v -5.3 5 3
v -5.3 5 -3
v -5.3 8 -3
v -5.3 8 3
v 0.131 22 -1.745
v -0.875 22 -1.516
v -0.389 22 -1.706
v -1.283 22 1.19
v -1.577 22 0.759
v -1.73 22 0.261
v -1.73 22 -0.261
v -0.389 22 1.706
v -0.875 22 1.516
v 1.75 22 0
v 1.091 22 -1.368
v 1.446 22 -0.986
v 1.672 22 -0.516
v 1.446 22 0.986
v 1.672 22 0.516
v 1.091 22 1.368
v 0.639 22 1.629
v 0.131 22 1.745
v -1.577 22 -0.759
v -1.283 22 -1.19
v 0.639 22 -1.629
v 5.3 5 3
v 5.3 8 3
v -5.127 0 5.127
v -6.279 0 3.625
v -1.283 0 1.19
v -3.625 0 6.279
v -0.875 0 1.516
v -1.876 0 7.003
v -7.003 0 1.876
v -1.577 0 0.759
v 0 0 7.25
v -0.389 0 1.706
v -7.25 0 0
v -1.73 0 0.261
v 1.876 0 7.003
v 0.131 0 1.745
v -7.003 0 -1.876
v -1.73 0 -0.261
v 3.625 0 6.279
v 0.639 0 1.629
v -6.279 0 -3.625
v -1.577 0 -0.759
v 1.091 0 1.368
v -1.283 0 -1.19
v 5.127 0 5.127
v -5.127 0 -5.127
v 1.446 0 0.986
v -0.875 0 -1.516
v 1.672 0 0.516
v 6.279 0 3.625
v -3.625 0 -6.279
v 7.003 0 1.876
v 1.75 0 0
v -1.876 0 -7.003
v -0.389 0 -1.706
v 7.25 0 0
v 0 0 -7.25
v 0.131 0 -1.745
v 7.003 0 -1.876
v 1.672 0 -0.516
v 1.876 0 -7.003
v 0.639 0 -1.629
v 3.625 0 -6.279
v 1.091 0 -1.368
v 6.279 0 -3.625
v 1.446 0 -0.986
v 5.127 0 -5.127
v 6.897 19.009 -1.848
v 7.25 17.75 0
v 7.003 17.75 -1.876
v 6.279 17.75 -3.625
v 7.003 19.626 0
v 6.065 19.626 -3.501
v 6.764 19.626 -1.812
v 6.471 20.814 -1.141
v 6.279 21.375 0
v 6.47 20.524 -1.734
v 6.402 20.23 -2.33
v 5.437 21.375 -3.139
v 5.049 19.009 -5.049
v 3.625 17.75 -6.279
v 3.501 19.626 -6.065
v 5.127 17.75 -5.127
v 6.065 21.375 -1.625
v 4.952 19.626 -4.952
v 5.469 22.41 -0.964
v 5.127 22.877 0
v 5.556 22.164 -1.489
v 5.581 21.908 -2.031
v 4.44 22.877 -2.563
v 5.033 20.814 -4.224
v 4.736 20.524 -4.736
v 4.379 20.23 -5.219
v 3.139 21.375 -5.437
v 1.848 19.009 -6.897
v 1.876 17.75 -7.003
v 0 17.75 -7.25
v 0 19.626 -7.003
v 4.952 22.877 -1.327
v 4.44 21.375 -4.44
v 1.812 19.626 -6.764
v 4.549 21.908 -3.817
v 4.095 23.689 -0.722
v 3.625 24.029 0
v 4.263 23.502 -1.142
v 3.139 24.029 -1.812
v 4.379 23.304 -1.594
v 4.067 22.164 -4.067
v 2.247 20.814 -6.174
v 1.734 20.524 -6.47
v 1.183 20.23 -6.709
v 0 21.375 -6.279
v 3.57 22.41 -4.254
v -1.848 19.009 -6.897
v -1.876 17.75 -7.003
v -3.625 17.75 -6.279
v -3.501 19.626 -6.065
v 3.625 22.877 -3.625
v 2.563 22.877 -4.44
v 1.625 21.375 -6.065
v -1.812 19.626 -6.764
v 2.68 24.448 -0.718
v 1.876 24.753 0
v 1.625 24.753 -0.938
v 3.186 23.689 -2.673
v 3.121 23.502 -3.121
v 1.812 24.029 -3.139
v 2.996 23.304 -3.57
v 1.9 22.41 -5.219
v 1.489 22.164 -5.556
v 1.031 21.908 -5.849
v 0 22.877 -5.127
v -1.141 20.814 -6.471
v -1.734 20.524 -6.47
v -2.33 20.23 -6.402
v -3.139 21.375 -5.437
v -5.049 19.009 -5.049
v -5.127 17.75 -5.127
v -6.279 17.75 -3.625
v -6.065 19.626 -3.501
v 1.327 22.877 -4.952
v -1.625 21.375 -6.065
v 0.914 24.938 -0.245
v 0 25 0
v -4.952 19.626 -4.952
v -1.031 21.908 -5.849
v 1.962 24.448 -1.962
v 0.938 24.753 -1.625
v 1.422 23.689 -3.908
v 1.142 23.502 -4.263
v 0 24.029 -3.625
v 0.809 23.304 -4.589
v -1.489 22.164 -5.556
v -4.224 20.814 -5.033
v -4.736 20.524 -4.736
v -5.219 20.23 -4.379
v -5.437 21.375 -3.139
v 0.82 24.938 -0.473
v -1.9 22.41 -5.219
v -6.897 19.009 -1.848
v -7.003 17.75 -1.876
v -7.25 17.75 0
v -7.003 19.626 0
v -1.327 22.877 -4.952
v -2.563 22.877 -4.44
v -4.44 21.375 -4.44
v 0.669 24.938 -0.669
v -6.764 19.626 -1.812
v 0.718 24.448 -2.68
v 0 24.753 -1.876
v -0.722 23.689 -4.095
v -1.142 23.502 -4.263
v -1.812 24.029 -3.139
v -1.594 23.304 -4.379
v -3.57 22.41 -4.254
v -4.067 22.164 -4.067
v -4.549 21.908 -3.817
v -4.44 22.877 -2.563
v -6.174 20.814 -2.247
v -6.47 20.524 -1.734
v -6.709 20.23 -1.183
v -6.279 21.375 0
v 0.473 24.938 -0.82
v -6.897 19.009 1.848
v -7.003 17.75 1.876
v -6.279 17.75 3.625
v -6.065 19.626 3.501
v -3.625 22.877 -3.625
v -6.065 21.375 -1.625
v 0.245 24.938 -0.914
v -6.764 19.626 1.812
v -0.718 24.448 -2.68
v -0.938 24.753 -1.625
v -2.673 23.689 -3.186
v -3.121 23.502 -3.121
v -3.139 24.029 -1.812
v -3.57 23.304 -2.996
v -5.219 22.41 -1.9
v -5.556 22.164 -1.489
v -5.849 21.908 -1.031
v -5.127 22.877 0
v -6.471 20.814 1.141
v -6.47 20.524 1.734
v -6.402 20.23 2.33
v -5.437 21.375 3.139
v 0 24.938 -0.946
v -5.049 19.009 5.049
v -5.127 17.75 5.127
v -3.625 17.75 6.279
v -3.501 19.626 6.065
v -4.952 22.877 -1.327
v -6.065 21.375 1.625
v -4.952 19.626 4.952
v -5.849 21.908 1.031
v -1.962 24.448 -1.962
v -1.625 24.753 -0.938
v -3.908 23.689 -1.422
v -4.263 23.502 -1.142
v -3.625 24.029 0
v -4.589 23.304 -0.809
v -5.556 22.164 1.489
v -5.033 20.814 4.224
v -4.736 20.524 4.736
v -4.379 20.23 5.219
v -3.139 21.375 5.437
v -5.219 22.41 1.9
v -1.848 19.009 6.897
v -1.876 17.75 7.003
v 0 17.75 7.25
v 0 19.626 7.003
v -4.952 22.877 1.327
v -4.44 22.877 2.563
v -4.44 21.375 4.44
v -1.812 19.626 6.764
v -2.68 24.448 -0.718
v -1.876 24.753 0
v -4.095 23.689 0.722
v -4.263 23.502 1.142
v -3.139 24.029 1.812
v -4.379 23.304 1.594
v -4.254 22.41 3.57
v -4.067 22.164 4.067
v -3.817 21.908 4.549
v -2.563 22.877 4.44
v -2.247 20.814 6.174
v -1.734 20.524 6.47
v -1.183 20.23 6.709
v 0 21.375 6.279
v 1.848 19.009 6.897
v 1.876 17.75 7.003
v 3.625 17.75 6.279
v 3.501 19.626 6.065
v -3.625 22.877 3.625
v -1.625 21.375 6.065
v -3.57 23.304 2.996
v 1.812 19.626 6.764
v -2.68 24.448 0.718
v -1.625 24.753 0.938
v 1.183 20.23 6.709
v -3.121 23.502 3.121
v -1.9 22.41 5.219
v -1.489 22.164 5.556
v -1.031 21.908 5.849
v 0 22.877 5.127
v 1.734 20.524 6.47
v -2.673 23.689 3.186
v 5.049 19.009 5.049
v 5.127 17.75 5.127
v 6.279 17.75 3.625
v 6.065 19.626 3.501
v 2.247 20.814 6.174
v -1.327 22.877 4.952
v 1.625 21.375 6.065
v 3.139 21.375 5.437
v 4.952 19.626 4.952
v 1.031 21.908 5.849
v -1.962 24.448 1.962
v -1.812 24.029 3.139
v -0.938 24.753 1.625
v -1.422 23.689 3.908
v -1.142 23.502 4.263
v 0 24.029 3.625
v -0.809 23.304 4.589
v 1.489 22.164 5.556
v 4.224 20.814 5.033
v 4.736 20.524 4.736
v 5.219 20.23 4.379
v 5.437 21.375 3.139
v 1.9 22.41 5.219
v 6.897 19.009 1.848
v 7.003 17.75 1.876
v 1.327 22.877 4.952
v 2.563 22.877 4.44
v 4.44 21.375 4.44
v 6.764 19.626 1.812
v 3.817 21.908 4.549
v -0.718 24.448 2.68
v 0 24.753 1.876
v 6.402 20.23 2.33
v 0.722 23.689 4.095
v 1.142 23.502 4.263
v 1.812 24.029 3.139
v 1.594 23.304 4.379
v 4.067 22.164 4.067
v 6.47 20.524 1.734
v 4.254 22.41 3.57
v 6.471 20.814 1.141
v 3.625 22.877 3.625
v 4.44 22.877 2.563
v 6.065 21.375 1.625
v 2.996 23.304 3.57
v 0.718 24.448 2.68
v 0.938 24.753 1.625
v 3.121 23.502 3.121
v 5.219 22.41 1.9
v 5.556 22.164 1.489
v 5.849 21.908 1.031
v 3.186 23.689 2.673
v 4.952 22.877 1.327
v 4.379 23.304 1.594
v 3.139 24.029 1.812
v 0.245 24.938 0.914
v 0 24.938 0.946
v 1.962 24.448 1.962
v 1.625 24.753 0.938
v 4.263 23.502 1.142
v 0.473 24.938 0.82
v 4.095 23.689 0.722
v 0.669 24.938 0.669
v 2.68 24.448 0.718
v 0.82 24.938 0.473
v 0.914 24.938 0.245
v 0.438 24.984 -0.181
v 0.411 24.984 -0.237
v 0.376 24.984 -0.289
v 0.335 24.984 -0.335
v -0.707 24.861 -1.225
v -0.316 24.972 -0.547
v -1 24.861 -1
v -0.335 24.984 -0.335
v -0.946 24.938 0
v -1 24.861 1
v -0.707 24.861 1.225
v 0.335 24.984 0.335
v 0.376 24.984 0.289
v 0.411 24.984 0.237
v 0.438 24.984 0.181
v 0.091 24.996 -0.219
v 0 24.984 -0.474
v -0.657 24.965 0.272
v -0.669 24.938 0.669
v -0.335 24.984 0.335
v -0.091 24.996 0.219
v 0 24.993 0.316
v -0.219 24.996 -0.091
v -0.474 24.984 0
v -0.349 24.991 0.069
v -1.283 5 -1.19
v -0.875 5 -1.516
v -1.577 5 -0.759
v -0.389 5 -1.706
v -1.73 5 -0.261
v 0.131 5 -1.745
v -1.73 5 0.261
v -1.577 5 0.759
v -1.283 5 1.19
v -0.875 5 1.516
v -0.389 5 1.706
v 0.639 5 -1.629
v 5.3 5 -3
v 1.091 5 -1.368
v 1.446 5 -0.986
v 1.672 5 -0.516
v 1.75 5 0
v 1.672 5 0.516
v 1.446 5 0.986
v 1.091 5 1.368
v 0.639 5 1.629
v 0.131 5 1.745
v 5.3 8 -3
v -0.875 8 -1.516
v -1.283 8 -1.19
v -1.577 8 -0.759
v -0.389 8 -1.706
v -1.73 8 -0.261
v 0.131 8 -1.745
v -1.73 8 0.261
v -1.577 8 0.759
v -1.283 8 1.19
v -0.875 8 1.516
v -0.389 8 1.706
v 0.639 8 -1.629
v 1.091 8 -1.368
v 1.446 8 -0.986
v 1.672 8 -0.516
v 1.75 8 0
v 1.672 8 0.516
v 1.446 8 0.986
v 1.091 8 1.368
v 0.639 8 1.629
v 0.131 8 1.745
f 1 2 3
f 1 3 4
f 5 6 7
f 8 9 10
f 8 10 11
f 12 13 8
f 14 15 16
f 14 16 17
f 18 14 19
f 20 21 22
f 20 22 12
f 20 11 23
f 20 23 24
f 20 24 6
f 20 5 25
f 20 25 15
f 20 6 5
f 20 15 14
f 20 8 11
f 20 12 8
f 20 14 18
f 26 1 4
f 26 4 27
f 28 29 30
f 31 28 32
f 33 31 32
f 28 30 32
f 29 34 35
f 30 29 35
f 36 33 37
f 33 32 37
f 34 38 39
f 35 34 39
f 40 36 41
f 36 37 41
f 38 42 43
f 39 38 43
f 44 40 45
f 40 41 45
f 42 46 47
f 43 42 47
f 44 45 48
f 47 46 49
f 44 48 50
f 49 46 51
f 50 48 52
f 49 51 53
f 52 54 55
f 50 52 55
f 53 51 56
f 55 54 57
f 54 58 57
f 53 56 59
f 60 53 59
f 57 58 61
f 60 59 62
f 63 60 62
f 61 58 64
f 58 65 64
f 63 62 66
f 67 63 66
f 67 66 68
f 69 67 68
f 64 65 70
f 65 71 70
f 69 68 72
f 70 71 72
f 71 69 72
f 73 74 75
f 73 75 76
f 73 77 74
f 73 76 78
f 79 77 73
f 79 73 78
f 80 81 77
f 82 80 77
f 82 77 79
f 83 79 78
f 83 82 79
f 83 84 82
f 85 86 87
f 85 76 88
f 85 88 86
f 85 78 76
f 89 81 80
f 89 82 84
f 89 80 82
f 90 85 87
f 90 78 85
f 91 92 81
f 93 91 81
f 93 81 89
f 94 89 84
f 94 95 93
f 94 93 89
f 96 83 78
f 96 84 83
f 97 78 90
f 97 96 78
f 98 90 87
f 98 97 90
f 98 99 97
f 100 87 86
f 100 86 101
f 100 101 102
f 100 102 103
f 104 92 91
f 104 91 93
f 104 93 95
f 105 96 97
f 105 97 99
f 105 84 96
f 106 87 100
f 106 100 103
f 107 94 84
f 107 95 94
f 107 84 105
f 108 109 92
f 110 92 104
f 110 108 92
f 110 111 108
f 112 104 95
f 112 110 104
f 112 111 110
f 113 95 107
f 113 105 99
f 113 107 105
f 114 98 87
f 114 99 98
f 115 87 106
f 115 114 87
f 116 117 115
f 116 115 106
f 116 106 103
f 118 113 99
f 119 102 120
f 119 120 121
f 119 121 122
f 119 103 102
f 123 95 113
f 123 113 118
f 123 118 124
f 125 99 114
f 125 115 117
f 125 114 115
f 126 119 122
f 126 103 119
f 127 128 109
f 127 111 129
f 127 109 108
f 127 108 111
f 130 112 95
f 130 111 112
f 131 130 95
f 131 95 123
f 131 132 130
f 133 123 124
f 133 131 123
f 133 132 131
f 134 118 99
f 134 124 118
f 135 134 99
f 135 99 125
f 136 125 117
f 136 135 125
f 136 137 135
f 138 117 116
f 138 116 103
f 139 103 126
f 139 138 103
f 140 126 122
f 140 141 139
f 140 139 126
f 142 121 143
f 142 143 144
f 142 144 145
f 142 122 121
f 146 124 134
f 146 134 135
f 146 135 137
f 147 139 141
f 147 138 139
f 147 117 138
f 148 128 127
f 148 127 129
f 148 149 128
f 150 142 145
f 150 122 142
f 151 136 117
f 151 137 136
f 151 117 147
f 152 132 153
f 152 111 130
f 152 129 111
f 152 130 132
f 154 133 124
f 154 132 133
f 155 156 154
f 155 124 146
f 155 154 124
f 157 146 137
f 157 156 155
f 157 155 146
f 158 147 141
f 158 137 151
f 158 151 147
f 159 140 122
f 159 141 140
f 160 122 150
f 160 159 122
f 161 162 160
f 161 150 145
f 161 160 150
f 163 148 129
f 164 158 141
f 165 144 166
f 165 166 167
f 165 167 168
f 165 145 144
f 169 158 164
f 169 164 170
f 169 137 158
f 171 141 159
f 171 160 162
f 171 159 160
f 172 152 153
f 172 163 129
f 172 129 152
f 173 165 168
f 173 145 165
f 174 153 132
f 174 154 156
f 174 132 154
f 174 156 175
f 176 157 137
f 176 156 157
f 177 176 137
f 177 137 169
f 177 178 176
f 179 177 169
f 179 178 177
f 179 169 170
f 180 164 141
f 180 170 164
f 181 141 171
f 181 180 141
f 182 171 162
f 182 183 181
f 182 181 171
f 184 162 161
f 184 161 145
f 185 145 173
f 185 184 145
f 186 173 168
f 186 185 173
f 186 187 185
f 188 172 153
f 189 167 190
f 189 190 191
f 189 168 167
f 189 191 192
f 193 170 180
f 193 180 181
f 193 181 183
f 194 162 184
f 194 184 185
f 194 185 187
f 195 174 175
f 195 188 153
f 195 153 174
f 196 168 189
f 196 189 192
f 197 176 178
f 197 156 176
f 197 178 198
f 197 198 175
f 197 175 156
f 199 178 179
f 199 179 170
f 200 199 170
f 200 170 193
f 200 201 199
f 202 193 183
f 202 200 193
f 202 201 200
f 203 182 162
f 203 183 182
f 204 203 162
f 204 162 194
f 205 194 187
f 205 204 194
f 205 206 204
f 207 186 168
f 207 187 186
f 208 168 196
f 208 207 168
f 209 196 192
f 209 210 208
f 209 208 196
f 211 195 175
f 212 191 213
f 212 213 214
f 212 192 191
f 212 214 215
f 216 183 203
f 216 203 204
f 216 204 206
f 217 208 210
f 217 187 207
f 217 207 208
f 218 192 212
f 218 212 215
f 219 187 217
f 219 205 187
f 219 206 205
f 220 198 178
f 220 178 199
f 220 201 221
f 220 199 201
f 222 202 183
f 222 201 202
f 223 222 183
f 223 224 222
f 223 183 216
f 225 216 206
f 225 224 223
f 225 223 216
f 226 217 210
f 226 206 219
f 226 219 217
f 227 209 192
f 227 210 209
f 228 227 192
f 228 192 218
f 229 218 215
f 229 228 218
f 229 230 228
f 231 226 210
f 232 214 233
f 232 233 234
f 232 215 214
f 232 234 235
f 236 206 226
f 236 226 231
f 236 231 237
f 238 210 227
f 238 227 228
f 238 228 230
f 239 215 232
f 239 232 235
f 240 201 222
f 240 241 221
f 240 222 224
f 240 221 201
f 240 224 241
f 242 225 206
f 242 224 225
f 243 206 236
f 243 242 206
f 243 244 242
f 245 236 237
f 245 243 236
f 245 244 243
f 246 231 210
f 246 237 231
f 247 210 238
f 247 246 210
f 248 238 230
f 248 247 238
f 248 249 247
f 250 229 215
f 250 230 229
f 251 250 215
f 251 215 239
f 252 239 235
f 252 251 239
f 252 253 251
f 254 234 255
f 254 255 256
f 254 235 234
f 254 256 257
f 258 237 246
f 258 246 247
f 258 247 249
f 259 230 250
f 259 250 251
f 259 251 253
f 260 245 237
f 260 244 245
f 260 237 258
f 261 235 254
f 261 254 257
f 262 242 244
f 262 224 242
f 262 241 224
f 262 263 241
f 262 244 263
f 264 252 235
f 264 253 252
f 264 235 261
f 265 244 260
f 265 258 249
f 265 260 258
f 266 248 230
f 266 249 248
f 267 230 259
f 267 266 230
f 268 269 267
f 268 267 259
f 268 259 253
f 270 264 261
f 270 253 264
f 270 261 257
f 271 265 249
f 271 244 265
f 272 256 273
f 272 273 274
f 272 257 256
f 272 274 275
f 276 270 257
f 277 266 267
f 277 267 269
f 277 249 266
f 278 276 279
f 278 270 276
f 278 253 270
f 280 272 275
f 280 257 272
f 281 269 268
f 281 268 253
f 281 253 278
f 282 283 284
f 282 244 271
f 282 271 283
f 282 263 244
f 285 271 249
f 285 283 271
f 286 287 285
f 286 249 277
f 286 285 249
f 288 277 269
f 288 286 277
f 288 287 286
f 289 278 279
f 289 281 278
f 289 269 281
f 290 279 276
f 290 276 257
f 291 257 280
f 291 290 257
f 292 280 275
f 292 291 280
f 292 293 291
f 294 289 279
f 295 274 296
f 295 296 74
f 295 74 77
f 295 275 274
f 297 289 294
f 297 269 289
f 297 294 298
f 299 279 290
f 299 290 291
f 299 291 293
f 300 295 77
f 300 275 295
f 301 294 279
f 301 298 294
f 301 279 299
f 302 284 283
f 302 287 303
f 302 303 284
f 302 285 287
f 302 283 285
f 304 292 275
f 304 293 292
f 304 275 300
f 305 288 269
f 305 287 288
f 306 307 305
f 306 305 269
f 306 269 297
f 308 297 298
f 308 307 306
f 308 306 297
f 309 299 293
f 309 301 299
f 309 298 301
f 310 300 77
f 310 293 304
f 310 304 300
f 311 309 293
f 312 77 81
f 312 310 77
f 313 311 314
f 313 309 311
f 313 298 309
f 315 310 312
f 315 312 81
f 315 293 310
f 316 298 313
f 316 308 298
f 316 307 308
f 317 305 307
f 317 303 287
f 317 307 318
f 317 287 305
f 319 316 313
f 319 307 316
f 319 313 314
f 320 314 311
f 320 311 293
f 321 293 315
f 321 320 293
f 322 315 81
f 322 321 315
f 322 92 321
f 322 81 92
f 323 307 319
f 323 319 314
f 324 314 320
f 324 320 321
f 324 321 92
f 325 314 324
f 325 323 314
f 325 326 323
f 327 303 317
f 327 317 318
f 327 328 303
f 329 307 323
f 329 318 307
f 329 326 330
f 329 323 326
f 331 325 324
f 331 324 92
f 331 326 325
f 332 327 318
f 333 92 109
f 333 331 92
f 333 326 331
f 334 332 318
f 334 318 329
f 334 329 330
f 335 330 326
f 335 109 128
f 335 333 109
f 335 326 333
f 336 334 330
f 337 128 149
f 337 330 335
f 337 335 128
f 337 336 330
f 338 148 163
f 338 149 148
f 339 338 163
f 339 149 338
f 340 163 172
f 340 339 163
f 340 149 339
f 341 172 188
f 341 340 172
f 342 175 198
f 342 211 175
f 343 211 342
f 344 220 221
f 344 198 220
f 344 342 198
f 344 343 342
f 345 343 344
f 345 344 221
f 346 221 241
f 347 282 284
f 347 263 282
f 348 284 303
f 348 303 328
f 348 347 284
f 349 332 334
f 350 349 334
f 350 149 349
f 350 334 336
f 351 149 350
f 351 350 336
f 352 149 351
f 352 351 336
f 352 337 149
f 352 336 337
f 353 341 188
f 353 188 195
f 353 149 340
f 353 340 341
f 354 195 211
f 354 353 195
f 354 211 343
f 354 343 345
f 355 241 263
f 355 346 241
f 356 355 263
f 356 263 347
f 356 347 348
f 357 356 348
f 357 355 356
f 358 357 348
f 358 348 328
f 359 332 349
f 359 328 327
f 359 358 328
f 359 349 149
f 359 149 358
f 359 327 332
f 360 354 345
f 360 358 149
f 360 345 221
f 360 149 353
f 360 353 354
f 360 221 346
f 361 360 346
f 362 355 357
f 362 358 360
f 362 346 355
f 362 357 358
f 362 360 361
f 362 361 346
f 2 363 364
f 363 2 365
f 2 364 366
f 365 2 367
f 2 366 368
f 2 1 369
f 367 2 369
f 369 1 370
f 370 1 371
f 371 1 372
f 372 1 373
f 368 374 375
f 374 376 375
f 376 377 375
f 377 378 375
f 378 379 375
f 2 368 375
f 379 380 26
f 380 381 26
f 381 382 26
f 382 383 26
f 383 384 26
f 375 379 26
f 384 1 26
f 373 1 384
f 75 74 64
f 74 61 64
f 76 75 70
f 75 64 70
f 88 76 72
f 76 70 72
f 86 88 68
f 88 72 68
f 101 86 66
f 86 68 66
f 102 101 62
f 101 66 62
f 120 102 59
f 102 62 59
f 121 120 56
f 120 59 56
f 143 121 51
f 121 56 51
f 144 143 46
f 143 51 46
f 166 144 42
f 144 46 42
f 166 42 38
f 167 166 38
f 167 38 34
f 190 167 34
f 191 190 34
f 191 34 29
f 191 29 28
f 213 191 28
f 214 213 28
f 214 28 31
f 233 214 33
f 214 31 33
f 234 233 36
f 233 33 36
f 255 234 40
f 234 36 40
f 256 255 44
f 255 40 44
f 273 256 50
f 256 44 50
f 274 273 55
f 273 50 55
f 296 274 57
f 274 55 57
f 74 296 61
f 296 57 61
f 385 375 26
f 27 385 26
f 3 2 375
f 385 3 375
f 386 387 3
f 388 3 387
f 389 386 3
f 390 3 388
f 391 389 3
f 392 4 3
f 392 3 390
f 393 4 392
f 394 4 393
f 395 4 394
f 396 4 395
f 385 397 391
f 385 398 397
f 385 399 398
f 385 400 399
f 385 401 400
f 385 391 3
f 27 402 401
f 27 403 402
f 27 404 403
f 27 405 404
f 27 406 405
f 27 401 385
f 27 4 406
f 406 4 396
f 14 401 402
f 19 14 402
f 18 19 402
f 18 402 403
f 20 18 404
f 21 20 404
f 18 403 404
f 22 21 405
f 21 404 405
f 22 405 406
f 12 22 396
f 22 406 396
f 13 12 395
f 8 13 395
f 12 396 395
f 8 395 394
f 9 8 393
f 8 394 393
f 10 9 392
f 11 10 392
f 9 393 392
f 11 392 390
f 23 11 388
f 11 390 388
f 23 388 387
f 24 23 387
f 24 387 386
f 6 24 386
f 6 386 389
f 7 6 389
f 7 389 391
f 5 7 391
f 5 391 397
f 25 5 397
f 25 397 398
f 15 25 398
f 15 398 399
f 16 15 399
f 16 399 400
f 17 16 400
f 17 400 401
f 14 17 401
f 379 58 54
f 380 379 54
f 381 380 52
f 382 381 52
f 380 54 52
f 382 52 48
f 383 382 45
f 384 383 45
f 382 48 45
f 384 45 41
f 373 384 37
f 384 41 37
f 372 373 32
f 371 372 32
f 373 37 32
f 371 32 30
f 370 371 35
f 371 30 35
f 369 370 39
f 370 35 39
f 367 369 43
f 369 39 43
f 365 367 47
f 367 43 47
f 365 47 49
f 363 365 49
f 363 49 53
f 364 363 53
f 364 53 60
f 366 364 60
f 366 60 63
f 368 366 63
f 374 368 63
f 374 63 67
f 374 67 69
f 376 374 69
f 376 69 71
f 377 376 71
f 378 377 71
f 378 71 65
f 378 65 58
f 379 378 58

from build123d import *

# Parameters (mm, degrees)
SKETCH001_W     = 10.6
SKETCH001_H     = 6
POCKET_DEPTH    = 3
SKETCH002_R     = 1.75
POCKET001_DEPTH = 22


with BuildPart() as part:
    # Sketch → Revolution (revolve)
    with BuildSketch(Plane.XY):
        with BuildLine():
            Line((7.25, 17.75), (7.25, 0))
            Line((7.25, 0), (0, 0))
            Line((0, 0), (0, 25))
            ThreePointArc((7.25, 17.75), (5.126524, 22.876524), (0, 25))
        make_face()
    revolve(axis=Axis((0, 0, 0), (0, 1, 0)))

    # Sketch001 (on DatumPlane) → Pocket (cut)
    with BuildSketch(Plane.XZ.offset(-5)):
        Rectangle(SKETCH001_W, SKETCH001_H)
    extrude(amount=-POCKET_DEPTH, mode=Mode.SUBTRACT)

    # Sketch002 → Pocket001 (cut)
    with BuildSketch(Plane.XZ):
        Circle(SKETCH002_R)
    extrude(amount=-POCKET001_DEPTH, mode=Mode.SUBTRACT)


solid = part.part
